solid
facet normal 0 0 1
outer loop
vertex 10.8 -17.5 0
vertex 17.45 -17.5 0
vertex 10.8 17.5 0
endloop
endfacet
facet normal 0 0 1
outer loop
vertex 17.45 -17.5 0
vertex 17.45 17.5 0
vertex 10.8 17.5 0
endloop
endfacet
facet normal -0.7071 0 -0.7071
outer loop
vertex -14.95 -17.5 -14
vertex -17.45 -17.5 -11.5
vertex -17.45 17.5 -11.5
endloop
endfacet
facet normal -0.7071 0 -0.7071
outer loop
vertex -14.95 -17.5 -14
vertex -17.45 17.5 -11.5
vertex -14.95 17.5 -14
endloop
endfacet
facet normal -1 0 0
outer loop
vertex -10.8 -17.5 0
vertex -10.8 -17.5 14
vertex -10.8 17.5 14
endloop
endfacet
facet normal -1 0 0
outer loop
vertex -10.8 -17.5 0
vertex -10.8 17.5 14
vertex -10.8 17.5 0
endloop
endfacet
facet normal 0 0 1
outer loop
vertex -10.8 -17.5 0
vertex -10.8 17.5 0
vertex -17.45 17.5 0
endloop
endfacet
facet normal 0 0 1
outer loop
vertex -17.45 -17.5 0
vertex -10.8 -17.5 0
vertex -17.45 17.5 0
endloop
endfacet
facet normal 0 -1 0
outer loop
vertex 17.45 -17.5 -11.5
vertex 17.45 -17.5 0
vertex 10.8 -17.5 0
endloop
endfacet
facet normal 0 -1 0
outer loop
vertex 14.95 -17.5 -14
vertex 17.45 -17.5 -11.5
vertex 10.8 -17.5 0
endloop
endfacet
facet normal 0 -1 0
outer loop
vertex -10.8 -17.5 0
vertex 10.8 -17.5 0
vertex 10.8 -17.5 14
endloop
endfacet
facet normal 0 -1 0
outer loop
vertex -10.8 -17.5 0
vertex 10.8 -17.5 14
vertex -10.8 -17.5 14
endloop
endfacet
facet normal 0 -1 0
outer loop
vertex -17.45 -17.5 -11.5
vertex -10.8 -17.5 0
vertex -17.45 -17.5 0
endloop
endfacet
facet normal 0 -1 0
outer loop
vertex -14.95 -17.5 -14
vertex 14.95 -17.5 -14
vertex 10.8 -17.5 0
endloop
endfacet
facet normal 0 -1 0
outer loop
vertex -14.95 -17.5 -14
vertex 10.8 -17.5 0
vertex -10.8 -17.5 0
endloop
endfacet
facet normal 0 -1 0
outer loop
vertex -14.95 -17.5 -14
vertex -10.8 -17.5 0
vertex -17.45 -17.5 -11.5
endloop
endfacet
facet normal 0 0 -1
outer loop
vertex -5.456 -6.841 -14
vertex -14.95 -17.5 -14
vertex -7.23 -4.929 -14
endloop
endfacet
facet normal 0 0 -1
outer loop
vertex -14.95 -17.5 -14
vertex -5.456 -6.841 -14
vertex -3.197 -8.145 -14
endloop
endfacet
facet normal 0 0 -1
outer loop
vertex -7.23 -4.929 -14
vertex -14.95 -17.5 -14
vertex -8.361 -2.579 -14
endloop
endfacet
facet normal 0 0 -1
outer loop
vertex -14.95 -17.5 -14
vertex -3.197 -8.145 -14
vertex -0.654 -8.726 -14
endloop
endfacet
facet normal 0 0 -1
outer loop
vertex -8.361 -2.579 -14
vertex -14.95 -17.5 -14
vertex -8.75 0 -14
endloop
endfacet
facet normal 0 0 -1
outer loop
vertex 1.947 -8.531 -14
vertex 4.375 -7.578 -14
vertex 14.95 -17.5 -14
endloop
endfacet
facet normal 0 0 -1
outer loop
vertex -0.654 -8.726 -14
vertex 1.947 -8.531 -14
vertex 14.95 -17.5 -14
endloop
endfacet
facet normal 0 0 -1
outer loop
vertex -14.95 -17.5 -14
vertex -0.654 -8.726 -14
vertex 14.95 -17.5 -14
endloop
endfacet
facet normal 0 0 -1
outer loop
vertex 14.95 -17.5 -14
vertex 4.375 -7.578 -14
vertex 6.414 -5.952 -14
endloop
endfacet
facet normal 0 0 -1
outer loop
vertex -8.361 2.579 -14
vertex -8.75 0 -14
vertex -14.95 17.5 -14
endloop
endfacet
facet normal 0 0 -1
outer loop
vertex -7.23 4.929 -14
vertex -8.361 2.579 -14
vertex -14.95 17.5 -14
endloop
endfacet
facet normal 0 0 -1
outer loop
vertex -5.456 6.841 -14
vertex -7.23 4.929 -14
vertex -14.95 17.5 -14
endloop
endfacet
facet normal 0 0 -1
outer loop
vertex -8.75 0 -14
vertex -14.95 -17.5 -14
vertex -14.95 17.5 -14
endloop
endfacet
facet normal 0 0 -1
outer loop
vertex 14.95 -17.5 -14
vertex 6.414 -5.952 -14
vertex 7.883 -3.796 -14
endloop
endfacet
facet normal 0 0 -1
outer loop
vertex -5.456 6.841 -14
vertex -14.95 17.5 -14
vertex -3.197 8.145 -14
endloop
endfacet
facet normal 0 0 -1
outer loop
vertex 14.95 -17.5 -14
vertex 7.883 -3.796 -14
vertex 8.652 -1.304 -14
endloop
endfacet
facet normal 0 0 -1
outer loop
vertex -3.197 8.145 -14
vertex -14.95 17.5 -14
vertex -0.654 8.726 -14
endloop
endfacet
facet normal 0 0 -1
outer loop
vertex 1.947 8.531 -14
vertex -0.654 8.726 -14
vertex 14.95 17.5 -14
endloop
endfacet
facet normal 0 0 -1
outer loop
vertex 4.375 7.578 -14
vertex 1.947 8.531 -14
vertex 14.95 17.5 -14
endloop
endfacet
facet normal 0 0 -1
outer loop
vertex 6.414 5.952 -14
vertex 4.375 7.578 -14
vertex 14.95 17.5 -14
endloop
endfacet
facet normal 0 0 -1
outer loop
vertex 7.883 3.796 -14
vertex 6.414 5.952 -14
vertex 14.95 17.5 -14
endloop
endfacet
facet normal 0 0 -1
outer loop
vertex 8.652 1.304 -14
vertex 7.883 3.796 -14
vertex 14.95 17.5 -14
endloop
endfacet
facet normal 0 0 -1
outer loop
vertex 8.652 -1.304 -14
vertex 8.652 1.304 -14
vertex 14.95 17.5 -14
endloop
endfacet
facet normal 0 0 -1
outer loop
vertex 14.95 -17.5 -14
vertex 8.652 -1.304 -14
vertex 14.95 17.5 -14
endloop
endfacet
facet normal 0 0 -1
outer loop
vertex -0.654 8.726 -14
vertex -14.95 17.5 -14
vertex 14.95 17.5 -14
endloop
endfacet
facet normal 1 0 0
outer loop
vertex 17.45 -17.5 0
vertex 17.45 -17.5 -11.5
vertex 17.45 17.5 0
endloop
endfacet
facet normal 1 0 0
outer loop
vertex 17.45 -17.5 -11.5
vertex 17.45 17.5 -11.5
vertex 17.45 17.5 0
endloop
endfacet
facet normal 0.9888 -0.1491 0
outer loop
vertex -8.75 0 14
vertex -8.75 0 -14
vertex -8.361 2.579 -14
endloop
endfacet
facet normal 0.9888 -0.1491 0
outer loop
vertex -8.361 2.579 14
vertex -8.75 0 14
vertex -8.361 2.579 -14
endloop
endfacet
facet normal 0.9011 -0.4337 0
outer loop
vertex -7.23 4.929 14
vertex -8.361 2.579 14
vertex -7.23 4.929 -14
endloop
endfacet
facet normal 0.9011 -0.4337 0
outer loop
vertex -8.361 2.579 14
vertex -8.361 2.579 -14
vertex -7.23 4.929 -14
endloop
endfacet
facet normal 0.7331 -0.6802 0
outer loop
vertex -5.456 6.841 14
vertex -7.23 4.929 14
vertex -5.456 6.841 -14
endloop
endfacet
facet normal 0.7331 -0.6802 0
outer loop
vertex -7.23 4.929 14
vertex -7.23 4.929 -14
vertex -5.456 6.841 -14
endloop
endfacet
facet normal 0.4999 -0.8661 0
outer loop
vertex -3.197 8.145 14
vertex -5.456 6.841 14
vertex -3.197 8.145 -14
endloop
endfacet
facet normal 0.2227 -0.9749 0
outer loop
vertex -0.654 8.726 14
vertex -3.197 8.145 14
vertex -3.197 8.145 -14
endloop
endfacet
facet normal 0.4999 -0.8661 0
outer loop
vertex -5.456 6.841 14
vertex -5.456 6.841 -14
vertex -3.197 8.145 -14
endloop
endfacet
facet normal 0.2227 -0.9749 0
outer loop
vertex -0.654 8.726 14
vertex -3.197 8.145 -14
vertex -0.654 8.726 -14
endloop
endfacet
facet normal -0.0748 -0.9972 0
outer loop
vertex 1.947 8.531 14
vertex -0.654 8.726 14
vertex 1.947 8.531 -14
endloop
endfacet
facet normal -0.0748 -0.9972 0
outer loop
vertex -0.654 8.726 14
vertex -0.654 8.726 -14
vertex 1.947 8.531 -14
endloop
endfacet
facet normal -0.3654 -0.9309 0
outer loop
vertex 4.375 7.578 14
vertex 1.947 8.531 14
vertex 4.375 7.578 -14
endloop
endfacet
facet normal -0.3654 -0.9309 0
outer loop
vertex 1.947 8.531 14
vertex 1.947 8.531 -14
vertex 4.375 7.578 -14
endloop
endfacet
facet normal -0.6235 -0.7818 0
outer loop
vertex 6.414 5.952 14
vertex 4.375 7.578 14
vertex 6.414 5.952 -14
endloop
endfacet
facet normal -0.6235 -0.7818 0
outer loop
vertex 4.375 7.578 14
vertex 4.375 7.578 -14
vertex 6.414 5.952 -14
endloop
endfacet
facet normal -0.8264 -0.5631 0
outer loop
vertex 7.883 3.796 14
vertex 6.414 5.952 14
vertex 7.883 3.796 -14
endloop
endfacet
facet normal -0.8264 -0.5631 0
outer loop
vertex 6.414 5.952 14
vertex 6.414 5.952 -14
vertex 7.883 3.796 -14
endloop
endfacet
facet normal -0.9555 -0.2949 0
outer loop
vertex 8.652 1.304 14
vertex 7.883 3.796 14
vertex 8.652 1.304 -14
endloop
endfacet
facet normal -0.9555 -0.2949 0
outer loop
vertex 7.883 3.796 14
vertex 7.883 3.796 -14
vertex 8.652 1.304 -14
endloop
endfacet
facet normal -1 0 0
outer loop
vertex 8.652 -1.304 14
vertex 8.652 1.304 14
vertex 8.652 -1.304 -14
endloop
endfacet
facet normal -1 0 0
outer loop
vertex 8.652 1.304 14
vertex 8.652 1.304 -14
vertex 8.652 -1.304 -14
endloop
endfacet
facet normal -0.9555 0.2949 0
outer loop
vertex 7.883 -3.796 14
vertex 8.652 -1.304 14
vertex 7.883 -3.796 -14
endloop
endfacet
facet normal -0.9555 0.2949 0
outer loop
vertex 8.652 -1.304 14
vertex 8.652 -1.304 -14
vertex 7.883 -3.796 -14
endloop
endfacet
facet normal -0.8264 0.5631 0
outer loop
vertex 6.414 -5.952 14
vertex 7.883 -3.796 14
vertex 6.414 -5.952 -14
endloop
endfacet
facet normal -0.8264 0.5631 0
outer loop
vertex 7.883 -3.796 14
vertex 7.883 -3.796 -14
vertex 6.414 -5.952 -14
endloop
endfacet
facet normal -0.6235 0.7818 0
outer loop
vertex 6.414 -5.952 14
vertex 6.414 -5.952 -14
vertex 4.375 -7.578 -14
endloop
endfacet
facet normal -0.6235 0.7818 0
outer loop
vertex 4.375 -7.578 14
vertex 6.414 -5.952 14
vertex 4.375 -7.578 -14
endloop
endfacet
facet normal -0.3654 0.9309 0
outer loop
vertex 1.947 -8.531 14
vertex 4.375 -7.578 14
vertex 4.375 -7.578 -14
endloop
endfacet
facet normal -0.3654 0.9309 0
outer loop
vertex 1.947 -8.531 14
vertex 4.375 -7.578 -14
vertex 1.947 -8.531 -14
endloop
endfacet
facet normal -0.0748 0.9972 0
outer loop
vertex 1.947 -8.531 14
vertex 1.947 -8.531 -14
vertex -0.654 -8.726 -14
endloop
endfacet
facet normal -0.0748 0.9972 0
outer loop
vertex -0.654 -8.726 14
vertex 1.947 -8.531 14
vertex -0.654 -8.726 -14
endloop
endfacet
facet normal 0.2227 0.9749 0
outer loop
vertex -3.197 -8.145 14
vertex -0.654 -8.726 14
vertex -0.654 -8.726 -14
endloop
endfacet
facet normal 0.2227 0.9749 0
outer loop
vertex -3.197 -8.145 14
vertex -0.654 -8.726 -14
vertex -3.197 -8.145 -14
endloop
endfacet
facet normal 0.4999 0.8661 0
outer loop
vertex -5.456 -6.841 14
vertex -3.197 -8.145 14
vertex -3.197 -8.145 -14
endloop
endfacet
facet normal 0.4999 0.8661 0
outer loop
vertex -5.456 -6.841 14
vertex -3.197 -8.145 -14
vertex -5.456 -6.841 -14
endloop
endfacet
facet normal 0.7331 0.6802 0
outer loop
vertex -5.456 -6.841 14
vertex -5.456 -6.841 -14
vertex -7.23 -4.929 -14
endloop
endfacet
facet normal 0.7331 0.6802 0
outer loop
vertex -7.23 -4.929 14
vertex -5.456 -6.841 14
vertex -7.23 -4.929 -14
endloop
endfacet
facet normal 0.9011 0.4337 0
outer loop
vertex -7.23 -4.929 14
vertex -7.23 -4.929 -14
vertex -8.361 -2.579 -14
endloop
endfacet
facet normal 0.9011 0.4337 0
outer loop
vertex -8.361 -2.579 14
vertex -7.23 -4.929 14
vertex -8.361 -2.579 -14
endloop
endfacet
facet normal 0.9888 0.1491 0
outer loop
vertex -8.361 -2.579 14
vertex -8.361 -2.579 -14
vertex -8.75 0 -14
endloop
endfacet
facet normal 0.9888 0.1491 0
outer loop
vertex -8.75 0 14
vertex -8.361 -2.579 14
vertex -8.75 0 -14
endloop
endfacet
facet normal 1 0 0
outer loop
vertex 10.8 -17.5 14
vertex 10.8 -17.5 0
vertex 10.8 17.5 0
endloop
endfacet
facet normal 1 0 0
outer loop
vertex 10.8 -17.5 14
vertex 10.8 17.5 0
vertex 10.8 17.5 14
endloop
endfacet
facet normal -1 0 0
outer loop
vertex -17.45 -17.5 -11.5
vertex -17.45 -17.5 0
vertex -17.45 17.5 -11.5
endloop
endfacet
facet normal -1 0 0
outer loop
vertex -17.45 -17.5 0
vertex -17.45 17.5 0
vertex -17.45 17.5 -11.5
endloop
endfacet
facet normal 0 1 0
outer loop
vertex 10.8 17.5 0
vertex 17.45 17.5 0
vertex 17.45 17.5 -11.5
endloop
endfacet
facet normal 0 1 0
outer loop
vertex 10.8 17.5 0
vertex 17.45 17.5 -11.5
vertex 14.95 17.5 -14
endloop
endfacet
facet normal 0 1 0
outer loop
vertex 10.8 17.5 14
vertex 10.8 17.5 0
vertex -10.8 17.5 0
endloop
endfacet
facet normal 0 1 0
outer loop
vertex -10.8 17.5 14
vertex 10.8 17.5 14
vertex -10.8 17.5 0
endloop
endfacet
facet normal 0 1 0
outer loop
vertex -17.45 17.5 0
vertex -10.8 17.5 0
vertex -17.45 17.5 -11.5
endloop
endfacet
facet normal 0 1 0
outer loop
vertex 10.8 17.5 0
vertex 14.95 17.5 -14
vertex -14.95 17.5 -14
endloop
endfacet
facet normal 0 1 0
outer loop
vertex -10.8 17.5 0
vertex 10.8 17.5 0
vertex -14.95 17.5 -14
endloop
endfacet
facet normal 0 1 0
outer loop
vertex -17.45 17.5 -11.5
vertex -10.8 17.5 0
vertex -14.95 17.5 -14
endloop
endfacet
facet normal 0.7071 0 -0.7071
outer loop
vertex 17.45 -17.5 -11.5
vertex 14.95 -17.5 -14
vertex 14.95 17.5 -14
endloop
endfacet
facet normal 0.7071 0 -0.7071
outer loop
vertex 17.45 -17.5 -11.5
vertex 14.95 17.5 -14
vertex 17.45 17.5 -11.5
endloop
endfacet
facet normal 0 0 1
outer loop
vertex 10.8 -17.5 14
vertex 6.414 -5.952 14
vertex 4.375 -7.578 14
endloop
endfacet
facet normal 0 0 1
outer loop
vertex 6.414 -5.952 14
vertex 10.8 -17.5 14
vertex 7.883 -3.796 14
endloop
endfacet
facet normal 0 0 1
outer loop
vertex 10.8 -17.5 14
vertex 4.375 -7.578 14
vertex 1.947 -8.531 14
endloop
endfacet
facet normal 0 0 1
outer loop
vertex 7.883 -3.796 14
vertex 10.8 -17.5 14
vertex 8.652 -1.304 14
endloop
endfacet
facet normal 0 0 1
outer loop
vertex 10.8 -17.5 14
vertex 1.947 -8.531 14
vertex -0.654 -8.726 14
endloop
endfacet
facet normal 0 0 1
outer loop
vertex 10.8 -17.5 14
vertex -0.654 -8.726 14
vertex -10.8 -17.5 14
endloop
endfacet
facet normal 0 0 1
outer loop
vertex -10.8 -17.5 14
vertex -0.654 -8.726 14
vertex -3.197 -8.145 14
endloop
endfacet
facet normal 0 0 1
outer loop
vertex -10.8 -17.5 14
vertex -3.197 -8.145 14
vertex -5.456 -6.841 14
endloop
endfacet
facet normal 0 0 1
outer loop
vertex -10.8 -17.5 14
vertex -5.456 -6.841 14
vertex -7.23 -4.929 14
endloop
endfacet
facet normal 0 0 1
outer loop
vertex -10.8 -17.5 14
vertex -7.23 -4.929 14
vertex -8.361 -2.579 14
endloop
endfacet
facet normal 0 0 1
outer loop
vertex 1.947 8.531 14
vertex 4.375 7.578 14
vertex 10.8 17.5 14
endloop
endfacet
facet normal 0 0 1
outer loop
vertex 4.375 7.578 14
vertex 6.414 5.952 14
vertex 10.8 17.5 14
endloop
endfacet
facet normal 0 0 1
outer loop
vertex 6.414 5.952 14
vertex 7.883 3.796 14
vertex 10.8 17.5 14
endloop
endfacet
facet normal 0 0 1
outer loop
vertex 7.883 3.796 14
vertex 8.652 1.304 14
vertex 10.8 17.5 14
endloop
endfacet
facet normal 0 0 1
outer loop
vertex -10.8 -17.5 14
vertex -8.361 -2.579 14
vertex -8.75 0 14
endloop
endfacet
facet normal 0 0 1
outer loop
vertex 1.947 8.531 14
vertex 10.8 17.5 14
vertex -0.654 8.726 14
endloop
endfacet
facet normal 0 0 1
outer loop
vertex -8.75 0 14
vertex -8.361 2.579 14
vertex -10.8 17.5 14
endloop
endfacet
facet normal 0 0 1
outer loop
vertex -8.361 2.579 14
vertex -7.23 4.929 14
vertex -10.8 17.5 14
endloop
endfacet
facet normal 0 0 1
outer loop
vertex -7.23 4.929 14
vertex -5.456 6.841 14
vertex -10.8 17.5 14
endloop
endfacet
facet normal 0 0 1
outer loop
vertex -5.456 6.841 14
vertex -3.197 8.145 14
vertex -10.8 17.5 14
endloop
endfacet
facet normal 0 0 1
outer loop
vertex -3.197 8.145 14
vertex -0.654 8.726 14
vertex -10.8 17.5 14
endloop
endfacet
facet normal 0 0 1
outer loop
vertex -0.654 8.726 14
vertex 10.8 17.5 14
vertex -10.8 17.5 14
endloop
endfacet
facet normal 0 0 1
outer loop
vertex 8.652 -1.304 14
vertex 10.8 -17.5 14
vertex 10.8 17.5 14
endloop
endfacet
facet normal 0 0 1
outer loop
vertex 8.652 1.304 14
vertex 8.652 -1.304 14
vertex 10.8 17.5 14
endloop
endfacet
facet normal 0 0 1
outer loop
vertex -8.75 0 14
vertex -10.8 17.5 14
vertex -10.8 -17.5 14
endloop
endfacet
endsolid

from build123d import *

# Parameters (mm, degrees)
BOSS_EXTRUDE1_DEPTH = 17.5
M20_TAPPED_HOLE1_D  = 17.5


with BuildPart() as part:
    # Sketch1 → Boss-Extrude1 (new, symmetric)
    with BuildSketch(Plane(origin=(0, 0, 0), x_dir=(1, 0, 0), z_dir=(0, 1, 0))):
        Polygon((-10.8, 0), (-17.45, 0), (-17.45, 11.5), (-14.95, 14), (14.95, 14), (17.45, 11.5), (17.45, 0), (10.8, 0), (10.8, -14), (-10.8, -14), align=None)
    extrude(amount=BOSS_EXTRUDE1_DEPTH, both=True)

    # M20 Tapped Hole1 (through all)
    with Locations(Plane.XY.offset(14)):
        with Locations((0, 0)):
            Hole(M20_TAPPED_HOLE1_D / 2)


solid = part.part
